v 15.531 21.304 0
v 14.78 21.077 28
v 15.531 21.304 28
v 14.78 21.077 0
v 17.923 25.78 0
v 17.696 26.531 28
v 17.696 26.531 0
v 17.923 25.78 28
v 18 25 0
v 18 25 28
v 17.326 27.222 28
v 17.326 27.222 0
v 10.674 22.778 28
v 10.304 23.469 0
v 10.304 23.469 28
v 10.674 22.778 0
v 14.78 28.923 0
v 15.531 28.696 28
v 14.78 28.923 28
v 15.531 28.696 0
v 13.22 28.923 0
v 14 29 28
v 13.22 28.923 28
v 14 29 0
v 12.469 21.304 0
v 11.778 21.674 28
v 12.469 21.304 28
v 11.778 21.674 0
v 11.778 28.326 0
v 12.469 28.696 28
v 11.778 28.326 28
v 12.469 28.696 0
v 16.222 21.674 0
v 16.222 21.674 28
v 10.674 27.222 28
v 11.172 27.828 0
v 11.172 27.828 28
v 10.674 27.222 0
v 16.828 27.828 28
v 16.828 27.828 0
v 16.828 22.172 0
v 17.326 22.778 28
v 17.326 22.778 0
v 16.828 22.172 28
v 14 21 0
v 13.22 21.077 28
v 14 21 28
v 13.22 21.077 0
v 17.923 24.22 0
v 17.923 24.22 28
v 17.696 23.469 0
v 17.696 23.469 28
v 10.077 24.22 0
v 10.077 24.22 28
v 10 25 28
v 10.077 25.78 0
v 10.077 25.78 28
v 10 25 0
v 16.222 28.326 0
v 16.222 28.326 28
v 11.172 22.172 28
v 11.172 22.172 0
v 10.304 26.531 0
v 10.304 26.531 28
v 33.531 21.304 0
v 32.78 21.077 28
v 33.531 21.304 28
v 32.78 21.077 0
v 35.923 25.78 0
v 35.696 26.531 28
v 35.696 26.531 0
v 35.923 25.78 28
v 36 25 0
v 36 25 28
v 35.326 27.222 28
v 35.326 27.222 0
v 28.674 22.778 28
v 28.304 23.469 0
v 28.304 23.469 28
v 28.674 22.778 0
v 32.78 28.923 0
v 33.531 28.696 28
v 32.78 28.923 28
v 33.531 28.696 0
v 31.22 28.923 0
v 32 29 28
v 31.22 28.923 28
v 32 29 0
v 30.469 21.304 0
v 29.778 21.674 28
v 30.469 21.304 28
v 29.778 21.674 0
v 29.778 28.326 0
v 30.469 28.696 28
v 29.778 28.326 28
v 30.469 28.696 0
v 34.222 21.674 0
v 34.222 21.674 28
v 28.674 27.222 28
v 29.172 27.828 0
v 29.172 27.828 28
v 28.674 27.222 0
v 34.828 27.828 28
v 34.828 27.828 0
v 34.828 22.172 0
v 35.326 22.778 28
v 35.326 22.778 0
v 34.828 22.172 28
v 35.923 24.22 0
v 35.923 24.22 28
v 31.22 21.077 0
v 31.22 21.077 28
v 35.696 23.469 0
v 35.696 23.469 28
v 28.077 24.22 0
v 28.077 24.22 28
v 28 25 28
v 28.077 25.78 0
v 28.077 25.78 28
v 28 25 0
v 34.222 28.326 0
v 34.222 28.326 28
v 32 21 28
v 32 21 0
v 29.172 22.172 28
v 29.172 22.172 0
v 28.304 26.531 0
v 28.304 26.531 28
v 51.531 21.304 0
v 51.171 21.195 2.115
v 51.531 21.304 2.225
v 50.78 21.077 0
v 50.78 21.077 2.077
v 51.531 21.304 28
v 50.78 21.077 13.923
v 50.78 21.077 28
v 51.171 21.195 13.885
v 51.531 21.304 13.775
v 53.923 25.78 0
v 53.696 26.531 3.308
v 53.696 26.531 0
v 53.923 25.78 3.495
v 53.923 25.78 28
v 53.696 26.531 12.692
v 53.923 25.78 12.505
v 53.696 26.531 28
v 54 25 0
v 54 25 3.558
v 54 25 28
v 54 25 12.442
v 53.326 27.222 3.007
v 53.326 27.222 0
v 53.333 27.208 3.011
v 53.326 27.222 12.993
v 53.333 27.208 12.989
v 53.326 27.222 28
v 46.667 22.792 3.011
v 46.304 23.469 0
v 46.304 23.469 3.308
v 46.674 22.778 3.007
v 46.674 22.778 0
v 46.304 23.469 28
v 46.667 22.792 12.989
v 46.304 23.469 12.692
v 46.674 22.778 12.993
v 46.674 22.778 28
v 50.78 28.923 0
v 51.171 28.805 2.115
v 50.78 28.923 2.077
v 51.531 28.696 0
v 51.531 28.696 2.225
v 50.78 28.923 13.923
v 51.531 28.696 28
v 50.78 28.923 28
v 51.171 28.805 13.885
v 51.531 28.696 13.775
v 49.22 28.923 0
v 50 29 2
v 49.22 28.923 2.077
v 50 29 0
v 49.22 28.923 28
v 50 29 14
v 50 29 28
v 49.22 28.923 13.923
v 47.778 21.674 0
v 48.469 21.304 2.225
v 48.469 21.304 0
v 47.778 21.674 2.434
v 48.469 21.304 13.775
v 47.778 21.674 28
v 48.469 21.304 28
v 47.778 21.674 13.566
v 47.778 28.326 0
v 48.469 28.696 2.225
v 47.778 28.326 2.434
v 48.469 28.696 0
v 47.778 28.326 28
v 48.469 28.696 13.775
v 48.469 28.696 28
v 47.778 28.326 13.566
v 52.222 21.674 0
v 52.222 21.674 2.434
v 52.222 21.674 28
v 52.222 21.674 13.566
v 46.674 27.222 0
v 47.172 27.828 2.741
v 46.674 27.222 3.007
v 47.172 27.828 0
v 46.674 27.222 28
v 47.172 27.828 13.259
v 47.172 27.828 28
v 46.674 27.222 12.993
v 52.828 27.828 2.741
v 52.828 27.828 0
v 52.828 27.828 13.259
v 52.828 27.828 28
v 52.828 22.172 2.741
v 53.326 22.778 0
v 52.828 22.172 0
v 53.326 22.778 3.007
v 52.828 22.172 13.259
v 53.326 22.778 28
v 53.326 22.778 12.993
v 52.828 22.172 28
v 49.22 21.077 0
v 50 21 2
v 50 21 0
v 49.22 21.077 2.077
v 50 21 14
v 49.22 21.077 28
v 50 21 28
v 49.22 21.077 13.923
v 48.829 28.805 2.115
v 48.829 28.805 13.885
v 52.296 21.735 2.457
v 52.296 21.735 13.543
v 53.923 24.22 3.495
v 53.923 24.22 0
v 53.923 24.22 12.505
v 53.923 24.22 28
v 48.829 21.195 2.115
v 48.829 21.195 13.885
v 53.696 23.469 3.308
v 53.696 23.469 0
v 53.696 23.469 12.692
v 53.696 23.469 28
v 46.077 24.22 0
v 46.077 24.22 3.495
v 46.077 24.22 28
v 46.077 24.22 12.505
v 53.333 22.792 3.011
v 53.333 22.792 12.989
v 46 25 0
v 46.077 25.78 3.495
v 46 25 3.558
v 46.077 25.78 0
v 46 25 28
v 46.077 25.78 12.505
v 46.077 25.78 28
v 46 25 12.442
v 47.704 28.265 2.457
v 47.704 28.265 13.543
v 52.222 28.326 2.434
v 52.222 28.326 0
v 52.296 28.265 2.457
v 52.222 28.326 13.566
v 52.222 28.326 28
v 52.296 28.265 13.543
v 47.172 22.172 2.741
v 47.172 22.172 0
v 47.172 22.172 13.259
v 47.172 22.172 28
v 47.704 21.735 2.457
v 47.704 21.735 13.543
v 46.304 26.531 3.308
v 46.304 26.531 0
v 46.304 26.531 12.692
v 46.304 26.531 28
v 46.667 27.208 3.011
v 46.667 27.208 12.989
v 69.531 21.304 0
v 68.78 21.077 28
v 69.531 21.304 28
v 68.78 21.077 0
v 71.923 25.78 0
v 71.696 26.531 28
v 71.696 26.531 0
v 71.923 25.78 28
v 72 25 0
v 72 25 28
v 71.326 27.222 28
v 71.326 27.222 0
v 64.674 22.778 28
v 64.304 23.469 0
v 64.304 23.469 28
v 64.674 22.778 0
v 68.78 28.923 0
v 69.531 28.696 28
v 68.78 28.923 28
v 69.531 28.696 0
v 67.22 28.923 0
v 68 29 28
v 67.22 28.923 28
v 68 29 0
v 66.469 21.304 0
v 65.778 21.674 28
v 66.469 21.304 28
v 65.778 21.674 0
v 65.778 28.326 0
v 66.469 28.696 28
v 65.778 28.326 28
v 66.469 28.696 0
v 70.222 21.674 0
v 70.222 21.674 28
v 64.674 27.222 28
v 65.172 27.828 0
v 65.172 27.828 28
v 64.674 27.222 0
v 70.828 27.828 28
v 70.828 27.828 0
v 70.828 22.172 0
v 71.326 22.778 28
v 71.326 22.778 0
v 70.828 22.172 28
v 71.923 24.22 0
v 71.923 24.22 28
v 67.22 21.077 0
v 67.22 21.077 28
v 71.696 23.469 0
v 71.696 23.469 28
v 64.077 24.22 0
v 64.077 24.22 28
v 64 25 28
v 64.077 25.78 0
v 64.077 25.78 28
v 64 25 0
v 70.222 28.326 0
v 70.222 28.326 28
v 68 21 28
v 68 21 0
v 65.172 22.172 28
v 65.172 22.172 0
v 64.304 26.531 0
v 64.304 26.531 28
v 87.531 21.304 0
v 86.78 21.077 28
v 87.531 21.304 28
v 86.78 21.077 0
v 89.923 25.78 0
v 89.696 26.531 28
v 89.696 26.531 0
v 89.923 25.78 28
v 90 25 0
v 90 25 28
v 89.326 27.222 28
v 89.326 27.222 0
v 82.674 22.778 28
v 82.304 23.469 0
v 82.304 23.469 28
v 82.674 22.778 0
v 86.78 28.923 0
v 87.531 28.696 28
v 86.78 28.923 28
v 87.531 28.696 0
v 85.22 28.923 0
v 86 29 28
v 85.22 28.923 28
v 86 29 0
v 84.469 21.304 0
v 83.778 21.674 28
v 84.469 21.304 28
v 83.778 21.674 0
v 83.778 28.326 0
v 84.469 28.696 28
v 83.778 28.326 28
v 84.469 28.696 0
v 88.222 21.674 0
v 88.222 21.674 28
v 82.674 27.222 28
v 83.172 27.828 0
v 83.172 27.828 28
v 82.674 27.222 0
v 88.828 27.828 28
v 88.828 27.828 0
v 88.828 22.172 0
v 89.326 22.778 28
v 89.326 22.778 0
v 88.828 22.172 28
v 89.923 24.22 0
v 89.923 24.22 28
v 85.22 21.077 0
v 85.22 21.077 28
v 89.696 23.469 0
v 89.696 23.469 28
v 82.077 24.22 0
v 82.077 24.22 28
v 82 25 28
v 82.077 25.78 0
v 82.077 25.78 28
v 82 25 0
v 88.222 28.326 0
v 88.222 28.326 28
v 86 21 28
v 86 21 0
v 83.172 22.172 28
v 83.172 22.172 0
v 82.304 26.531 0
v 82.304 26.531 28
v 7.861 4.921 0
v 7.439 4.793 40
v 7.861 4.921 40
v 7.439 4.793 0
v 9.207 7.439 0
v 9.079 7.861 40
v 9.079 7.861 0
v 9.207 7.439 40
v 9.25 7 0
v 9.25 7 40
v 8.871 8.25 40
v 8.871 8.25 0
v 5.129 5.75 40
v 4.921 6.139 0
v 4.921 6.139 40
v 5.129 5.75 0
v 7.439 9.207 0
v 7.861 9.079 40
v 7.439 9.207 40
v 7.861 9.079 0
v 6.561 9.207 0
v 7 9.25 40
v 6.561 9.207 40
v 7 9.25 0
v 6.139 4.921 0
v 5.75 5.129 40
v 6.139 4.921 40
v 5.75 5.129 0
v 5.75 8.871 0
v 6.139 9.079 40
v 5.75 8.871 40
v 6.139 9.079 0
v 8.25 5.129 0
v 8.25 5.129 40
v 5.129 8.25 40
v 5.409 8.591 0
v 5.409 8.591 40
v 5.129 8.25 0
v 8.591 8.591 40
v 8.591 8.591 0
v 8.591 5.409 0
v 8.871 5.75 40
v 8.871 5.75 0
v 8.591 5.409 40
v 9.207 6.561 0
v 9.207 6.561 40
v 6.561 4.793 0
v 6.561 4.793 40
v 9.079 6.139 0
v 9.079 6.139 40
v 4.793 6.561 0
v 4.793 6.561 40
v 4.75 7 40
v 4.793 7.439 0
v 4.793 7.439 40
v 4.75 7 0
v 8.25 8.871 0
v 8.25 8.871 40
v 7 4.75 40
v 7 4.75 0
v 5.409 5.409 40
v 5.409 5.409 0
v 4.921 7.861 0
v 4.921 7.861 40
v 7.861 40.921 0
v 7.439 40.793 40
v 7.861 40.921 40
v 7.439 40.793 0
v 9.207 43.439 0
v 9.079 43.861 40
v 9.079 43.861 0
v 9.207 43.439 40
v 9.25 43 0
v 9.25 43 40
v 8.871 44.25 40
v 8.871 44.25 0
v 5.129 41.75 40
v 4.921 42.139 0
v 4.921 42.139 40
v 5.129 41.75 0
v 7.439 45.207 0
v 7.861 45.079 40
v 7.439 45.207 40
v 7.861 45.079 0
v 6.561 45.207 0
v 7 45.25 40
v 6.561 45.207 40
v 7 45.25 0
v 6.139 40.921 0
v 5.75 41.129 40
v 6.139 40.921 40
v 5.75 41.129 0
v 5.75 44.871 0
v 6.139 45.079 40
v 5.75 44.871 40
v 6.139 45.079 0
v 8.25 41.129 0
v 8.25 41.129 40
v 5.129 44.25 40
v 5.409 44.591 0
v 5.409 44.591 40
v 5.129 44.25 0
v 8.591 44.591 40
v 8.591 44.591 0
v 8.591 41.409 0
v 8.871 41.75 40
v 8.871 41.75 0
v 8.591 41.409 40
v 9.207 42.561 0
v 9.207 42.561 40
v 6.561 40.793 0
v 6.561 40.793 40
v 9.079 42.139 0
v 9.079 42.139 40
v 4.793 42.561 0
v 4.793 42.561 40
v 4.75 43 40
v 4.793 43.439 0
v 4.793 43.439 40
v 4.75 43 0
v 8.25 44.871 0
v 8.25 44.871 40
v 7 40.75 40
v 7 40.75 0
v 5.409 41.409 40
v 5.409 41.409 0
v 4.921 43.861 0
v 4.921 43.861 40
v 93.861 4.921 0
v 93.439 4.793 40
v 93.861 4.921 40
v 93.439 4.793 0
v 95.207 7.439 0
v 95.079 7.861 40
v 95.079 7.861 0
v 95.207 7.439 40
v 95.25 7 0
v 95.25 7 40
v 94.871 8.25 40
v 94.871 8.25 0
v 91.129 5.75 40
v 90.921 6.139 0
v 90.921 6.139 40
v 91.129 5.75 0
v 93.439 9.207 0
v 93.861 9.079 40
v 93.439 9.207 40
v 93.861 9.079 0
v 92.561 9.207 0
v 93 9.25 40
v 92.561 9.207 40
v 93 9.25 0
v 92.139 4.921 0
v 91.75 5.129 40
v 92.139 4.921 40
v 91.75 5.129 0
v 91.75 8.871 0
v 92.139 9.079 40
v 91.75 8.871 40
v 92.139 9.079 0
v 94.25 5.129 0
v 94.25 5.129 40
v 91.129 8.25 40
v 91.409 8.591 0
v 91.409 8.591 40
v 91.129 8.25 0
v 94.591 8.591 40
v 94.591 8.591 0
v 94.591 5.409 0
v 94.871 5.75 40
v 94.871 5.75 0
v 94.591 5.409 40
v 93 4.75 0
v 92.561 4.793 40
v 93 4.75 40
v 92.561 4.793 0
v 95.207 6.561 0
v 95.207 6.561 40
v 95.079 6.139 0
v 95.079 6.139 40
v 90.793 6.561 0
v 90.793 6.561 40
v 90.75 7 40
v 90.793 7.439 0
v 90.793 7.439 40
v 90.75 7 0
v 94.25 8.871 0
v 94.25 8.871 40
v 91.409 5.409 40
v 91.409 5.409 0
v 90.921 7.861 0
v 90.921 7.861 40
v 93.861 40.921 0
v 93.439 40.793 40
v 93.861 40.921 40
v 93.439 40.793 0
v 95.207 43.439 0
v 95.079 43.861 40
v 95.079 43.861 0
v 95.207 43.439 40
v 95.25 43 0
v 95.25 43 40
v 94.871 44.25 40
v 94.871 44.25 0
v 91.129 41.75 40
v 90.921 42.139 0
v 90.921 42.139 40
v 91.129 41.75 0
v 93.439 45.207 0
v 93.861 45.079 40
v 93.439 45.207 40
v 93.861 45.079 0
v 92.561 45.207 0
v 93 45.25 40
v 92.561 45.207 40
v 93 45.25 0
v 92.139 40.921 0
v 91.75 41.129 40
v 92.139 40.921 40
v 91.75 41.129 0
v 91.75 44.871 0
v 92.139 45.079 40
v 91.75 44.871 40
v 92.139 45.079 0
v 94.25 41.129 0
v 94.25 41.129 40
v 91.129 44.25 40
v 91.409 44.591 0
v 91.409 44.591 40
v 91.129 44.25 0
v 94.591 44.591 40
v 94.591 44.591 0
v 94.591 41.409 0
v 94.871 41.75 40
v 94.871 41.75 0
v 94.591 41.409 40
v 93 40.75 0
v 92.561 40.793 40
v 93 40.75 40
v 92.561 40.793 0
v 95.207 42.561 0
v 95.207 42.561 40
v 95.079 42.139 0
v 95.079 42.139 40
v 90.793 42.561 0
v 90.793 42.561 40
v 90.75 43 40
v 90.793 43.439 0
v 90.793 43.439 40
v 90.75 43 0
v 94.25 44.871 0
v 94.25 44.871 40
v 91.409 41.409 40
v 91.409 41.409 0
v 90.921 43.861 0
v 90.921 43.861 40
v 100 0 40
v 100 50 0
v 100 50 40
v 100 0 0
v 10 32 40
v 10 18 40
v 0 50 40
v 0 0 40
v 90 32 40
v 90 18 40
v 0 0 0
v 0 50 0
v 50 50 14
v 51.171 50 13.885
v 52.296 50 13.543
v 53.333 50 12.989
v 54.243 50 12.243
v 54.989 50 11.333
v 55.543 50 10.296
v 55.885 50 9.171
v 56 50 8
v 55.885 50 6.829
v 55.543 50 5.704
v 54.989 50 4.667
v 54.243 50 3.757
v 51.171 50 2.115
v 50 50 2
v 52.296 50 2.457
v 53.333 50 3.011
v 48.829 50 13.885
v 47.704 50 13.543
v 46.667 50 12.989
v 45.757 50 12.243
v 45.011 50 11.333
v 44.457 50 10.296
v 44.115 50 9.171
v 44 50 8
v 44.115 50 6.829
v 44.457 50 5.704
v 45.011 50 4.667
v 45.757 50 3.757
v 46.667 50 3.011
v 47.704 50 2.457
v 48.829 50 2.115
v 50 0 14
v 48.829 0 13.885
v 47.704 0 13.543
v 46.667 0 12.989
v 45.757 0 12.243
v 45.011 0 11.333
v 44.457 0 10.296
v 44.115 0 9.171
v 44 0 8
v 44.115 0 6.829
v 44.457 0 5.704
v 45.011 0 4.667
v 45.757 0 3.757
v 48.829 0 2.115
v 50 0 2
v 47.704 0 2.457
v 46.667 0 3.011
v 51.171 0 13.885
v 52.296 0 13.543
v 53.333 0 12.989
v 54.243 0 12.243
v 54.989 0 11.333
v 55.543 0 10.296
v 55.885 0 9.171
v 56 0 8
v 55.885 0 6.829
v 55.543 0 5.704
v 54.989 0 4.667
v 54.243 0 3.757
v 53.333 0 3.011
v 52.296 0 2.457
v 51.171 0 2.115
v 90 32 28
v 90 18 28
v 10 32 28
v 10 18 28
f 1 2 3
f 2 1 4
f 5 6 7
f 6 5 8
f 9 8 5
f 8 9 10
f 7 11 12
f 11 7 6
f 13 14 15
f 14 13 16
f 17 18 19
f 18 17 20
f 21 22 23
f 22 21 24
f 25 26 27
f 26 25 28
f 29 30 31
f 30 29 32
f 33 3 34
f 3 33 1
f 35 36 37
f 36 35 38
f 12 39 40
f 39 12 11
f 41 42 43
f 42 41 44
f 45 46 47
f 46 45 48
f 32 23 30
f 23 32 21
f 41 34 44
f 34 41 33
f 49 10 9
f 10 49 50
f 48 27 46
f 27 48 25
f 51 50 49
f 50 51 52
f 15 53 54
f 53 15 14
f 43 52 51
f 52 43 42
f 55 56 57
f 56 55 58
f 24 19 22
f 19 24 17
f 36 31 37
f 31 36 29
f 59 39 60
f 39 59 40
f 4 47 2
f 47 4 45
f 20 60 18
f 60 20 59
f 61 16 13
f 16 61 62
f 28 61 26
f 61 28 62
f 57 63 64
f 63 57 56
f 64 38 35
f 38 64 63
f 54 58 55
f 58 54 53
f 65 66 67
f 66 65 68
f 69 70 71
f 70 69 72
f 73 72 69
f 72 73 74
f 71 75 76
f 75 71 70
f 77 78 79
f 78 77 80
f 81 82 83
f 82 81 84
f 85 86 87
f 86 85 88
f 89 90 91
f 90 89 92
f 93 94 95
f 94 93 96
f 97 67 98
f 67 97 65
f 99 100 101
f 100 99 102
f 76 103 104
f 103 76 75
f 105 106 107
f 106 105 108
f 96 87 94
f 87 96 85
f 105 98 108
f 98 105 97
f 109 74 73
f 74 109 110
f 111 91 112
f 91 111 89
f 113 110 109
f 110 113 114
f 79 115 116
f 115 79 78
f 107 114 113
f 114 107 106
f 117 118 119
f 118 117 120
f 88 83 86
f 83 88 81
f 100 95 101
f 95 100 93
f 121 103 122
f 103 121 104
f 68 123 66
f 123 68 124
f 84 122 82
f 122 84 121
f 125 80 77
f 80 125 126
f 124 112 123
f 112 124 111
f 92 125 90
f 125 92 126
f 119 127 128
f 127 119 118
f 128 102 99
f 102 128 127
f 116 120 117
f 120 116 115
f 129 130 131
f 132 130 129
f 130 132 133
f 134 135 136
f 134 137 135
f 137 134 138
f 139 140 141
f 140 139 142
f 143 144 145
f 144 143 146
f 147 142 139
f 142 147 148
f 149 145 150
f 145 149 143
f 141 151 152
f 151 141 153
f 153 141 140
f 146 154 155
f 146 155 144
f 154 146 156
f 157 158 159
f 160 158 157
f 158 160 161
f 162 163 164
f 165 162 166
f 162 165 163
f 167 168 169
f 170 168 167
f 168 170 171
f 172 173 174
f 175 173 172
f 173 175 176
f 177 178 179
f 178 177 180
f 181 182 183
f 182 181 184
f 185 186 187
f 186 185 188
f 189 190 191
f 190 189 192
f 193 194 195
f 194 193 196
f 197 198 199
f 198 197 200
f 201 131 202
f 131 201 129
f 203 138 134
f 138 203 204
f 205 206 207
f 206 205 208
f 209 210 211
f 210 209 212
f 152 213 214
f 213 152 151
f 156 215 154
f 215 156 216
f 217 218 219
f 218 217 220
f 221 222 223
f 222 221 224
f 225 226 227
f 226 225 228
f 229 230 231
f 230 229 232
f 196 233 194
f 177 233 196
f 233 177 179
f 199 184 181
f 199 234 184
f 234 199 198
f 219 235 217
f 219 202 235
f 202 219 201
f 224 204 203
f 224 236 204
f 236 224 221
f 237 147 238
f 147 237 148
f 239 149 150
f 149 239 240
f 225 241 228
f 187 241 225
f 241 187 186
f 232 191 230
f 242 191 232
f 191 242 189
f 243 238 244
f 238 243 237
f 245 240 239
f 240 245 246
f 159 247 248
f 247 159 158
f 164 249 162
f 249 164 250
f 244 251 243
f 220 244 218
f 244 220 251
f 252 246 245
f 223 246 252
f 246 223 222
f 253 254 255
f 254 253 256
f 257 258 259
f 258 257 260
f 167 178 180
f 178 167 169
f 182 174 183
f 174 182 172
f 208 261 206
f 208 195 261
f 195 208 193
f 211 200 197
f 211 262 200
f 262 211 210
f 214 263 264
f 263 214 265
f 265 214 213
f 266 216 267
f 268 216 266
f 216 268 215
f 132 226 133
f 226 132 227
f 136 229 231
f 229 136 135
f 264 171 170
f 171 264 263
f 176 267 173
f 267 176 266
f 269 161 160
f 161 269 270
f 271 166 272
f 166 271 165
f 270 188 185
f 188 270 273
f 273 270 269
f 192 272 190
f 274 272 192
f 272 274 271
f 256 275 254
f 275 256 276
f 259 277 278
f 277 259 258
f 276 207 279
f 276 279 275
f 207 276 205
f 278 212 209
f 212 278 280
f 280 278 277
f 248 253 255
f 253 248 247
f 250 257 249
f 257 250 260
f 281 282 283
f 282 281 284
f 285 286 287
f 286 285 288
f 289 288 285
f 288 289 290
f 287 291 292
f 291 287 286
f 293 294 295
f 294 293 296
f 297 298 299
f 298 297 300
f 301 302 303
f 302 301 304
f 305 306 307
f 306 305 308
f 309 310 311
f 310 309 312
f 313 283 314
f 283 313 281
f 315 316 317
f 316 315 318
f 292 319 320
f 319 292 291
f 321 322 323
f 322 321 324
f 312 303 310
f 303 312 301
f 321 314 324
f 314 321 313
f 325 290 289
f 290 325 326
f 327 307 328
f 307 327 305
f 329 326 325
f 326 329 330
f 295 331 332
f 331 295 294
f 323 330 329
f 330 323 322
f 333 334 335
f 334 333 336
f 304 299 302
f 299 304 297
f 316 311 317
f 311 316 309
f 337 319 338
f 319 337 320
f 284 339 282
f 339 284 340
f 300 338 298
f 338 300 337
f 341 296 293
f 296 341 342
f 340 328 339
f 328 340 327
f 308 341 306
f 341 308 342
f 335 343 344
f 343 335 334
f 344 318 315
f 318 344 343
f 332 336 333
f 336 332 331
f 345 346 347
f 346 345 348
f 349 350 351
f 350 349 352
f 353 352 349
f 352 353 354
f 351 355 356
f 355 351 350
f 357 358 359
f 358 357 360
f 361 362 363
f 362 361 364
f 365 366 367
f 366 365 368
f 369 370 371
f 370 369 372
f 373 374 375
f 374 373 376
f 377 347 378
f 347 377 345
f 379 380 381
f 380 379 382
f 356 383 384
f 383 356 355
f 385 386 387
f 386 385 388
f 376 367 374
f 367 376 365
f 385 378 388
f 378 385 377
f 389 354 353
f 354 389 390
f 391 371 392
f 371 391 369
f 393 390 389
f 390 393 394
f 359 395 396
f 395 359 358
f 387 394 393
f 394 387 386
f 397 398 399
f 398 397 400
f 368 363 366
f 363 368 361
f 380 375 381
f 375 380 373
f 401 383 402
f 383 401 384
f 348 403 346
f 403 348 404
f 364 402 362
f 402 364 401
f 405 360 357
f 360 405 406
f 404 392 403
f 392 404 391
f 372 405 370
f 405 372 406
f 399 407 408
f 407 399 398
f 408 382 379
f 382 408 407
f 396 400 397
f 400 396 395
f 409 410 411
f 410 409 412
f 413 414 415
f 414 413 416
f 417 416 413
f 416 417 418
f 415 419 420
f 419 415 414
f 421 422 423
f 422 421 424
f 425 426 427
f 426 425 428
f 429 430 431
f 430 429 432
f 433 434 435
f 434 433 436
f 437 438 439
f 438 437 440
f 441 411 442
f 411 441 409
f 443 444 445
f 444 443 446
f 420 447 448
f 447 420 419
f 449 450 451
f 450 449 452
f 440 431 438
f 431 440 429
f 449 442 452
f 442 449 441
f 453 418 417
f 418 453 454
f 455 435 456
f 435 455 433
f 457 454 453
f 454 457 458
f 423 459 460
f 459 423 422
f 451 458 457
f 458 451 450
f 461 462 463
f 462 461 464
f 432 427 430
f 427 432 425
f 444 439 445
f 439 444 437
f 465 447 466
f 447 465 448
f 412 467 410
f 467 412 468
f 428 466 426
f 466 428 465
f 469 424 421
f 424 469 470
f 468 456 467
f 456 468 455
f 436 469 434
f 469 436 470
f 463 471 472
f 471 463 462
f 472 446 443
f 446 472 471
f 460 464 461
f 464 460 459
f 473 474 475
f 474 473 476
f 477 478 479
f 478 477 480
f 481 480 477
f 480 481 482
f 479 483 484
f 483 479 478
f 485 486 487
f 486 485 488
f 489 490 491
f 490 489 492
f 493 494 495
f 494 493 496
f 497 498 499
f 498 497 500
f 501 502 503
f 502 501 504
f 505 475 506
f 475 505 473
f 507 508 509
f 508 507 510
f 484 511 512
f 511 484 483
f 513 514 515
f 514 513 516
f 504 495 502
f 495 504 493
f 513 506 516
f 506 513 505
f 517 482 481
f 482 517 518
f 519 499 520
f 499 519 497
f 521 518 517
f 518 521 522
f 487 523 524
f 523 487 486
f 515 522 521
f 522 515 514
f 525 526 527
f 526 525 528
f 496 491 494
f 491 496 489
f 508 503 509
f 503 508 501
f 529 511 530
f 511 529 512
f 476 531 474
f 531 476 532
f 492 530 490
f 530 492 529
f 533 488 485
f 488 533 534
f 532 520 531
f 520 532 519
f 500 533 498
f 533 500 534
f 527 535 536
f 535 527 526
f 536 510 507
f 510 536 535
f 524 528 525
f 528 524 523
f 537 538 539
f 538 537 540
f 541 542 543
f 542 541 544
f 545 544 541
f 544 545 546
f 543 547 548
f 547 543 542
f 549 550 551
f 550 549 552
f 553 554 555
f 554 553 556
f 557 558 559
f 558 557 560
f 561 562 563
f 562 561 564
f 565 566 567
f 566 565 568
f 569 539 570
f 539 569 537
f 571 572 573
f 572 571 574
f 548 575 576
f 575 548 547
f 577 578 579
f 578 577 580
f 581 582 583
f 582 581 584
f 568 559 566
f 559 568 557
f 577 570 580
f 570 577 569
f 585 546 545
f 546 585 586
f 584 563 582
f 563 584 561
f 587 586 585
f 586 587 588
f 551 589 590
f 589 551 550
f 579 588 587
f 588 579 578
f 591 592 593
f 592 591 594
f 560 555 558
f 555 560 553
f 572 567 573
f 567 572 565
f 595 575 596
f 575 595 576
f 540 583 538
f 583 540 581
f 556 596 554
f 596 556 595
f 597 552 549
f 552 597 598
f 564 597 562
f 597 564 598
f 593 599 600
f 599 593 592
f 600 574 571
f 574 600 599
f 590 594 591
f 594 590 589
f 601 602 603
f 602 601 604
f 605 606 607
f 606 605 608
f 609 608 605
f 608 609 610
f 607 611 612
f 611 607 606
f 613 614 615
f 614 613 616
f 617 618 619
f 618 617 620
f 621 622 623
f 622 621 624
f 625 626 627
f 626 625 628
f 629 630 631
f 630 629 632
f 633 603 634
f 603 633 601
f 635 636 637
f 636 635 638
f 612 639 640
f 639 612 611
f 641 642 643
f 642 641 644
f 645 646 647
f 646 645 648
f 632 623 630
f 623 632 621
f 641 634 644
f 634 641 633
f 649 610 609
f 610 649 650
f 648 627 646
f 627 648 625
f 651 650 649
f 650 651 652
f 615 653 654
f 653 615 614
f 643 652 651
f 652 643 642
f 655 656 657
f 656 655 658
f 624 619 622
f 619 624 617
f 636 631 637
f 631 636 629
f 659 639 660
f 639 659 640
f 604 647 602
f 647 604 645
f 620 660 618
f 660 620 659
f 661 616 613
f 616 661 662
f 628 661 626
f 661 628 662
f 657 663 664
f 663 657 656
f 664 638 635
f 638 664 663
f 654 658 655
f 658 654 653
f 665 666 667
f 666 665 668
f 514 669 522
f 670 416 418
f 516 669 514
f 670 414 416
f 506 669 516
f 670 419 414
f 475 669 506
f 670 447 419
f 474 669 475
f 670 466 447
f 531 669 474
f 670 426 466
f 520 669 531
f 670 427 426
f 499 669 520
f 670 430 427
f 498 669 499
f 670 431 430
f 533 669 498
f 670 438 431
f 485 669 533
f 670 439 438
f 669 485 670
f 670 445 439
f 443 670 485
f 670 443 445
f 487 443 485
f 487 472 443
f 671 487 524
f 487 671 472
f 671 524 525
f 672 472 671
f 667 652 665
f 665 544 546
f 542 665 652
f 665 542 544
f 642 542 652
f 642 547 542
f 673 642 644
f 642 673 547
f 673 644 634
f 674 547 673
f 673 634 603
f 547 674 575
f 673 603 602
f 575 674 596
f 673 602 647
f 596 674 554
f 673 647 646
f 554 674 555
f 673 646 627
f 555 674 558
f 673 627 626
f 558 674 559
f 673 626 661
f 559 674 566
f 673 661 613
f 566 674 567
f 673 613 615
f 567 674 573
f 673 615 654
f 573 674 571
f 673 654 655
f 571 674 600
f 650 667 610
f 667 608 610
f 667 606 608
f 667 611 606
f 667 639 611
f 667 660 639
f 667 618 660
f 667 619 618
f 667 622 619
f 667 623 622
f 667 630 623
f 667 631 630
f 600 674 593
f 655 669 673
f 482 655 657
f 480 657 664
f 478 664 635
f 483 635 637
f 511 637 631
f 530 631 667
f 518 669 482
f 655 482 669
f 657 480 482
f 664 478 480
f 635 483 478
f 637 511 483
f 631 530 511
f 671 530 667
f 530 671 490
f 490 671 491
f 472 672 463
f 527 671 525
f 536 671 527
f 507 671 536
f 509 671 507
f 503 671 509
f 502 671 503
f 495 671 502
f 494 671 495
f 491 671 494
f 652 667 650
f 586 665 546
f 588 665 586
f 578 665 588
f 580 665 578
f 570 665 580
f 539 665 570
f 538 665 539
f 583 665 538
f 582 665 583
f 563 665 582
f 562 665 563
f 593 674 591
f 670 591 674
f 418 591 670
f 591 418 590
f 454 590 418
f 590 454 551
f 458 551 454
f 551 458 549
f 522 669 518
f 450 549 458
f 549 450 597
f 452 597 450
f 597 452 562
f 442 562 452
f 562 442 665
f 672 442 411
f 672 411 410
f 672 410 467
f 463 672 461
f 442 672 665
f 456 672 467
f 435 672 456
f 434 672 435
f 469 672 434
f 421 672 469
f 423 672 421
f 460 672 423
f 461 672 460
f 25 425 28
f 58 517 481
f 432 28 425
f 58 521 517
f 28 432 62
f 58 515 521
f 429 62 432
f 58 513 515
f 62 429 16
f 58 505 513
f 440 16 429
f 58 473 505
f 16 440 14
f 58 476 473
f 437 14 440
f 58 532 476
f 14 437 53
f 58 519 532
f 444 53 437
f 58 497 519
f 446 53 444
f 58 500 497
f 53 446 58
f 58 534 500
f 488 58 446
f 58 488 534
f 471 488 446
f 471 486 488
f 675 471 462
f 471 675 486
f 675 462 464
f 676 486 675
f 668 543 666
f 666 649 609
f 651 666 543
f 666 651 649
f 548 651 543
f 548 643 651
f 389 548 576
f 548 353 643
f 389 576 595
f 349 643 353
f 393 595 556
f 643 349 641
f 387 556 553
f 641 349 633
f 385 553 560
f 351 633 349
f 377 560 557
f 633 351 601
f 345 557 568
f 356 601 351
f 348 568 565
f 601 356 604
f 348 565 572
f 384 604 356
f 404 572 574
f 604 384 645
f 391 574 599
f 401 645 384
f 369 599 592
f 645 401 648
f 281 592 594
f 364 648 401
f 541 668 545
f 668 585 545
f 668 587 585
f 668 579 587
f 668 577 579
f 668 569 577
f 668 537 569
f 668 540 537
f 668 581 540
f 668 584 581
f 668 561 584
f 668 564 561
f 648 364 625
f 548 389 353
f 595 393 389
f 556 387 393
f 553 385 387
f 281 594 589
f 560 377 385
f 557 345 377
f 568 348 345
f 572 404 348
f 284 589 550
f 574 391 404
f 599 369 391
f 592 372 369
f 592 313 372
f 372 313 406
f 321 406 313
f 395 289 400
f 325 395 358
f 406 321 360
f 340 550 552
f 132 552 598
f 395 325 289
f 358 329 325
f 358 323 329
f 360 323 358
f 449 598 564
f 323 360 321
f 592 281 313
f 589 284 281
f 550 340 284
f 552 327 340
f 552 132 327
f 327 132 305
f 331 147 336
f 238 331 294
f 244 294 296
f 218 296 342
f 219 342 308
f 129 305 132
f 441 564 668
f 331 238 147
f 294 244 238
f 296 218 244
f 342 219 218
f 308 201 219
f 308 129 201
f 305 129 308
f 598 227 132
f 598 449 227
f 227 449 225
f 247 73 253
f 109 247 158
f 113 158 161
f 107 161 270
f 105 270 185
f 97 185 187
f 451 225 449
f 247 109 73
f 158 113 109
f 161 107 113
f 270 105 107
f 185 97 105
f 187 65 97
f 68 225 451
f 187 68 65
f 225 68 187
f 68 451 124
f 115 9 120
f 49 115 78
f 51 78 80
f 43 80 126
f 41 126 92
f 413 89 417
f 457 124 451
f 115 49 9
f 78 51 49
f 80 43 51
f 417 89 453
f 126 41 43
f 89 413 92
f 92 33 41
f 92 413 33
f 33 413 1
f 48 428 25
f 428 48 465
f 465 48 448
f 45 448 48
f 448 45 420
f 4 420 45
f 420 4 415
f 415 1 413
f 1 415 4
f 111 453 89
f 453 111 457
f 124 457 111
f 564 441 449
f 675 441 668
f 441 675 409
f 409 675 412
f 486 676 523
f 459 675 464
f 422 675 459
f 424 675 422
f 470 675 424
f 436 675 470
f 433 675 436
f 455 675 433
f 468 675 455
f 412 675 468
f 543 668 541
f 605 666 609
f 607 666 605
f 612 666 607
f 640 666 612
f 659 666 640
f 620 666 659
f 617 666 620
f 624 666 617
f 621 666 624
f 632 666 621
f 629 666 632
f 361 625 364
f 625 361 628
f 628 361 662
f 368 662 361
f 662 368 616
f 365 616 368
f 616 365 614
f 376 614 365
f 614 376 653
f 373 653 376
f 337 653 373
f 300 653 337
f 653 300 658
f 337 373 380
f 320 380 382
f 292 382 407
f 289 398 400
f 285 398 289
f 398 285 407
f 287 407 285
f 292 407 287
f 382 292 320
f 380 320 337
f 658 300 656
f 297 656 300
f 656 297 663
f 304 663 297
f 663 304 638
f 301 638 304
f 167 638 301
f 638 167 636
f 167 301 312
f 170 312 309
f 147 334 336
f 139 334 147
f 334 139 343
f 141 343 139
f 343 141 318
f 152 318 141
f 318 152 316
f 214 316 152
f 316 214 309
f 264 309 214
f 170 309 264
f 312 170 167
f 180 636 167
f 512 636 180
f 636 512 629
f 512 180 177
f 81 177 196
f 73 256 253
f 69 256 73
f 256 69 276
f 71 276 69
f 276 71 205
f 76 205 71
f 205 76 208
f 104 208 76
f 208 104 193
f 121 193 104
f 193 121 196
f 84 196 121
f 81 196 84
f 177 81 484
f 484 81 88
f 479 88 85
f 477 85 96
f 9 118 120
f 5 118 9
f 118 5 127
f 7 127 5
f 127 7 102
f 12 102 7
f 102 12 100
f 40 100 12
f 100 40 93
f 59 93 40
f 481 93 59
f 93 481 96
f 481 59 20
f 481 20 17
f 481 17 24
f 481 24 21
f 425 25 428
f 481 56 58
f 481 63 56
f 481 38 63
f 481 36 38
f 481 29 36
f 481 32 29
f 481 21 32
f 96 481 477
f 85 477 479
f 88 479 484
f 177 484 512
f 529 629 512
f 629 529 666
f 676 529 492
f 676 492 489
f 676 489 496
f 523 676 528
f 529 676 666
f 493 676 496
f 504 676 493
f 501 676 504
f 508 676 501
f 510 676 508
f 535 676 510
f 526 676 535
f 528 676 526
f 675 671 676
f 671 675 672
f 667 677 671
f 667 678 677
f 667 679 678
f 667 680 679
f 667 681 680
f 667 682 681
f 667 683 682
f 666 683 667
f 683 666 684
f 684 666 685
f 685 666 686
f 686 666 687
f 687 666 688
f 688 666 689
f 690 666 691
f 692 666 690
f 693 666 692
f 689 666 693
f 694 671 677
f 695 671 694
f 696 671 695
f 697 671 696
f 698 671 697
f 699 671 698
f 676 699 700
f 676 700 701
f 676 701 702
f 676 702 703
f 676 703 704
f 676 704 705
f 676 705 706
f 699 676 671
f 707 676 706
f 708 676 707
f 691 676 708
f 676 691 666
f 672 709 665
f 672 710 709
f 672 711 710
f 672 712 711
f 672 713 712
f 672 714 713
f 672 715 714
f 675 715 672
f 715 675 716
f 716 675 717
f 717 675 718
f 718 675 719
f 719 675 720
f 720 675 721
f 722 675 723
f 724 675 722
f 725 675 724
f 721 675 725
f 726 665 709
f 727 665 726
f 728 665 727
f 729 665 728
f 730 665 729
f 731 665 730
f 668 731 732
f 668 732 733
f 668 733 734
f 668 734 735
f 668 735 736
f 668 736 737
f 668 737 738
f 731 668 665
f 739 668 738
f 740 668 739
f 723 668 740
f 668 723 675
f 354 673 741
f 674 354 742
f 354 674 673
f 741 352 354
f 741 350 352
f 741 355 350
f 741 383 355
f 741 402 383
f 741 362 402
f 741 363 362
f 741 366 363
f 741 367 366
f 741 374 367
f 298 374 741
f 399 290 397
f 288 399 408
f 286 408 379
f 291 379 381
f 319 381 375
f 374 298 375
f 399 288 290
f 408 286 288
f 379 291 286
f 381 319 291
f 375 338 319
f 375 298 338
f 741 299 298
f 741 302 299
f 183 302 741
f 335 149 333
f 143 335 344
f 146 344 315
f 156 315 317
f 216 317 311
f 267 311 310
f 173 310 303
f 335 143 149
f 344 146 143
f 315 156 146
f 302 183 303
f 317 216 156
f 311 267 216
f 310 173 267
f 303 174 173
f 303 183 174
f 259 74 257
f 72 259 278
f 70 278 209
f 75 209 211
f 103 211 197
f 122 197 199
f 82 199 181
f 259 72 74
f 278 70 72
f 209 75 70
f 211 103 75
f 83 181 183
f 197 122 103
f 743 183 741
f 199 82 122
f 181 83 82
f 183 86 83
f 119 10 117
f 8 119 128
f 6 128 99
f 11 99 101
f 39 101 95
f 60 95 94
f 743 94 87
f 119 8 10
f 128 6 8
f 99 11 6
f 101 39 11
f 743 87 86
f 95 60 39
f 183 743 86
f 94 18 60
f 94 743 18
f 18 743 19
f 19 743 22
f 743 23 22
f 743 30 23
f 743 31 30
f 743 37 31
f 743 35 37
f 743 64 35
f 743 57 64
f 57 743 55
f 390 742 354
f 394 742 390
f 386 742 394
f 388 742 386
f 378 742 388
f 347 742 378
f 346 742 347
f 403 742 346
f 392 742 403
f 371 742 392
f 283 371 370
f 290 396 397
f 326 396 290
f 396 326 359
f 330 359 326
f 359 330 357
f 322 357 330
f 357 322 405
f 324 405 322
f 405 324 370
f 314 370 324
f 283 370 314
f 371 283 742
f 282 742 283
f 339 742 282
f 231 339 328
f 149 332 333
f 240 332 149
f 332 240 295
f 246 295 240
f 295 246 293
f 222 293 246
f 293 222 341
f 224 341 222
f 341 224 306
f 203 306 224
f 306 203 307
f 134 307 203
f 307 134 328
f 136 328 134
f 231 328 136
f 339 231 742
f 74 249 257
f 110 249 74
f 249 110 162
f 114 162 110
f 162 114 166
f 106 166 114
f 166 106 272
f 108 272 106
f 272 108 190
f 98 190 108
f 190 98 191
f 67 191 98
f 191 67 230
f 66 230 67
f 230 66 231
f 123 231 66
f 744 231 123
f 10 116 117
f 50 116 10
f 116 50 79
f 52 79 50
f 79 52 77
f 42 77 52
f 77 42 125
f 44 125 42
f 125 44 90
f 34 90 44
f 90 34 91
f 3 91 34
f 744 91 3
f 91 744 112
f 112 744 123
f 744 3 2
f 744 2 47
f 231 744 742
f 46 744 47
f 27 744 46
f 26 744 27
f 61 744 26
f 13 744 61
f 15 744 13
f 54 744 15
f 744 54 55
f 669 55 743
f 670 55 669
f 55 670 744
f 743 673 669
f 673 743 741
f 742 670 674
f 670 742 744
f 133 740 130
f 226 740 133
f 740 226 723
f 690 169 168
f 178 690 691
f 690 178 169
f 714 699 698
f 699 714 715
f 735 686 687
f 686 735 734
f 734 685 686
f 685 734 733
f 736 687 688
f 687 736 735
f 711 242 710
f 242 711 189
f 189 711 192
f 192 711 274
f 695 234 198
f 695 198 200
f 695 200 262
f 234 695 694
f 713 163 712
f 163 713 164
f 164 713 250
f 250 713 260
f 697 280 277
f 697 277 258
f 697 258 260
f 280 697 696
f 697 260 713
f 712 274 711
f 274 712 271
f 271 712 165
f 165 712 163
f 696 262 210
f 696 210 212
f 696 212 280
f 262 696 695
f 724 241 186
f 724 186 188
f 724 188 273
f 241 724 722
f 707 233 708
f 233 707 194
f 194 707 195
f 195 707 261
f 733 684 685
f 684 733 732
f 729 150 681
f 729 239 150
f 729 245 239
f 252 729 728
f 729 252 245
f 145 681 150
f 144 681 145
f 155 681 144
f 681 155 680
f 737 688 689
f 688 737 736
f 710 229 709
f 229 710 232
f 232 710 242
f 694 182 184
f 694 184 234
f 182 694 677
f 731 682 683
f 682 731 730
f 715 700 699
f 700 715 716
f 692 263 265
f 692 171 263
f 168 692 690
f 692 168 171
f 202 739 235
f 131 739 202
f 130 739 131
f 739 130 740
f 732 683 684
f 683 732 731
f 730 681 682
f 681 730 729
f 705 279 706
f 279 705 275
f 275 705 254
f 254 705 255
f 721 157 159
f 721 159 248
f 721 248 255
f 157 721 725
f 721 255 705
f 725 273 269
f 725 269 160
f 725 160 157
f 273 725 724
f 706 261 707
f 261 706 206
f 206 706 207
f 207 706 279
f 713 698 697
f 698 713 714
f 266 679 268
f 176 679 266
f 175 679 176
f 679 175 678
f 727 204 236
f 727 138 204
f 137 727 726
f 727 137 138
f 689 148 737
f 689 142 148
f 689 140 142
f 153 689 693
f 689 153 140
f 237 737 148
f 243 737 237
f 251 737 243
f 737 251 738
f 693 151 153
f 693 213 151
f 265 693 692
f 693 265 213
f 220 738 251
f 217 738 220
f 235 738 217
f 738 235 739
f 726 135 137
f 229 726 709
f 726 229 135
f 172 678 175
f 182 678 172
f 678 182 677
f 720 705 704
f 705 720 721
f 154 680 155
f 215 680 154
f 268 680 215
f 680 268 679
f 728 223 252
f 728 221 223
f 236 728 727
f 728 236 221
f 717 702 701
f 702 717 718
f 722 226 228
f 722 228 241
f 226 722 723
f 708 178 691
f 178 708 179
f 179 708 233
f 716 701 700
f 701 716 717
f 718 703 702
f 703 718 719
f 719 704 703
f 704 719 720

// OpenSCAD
$fn = 32;

// ----------------------------------------------------------------------
// Manifold block: side_outlet manifold
// ----------------------------------------------------------------------

// --- parameters (mm) ---
block_l = 100;            // block length, X
block_w = 50;             // block width, Y
block_h = 40;             // block height, Z
port_d = 8;               // port bore diameter
port_pitch = 18;          // port pitch along X
gallery_d = 14;           // top gallery width, Y
gallery_depth = 12;       // gallery pocket depth
wall_p = 10;              // gallery end wall thickness, X
mnt_d = 4.5;              // mounting hole diameter
mnt_in = 7;               // mounting hole inset from the edges
out_d = 12;               // outlet bore diameter
out_z = 8;                // outlet axis height
fit_tol = 0.02;           // tolerance for press fits, mm
free_tol = 0.2;           // tolerance for clearance fits, mm

n_ports = 5;  // ports in the row
port_x0 = (block_l - (n_ports - 1) * port_pitch) / 2;  // first port X

difference() {
  cube([block_l, block_w, block_h]);
  for (i = [0 : n_ports - 1])
    translate([port_x0 + i * port_pitch, block_w / 2, -1])
      cylinder(h = block_h + 2, d = port_d);
  translate([wall_p, block_w / 2 - gallery_d / 2, block_h - gallery_depth])
    cube([block_l - 2 * wall_p, gallery_d, gallery_depth + 1]);
  for (cx = [mnt_in, block_l - mnt_in])
    for (cy = [mnt_in, block_w - mnt_in])
      translate([cx, cy, -1]) cylinder(h = block_h + 2, d = mnt_d);
  translate([block_l / 2, -1, out_z]) rotate([-90, 0, 0])
    cylinder(h = block_w + 2, d = out_d);
}
